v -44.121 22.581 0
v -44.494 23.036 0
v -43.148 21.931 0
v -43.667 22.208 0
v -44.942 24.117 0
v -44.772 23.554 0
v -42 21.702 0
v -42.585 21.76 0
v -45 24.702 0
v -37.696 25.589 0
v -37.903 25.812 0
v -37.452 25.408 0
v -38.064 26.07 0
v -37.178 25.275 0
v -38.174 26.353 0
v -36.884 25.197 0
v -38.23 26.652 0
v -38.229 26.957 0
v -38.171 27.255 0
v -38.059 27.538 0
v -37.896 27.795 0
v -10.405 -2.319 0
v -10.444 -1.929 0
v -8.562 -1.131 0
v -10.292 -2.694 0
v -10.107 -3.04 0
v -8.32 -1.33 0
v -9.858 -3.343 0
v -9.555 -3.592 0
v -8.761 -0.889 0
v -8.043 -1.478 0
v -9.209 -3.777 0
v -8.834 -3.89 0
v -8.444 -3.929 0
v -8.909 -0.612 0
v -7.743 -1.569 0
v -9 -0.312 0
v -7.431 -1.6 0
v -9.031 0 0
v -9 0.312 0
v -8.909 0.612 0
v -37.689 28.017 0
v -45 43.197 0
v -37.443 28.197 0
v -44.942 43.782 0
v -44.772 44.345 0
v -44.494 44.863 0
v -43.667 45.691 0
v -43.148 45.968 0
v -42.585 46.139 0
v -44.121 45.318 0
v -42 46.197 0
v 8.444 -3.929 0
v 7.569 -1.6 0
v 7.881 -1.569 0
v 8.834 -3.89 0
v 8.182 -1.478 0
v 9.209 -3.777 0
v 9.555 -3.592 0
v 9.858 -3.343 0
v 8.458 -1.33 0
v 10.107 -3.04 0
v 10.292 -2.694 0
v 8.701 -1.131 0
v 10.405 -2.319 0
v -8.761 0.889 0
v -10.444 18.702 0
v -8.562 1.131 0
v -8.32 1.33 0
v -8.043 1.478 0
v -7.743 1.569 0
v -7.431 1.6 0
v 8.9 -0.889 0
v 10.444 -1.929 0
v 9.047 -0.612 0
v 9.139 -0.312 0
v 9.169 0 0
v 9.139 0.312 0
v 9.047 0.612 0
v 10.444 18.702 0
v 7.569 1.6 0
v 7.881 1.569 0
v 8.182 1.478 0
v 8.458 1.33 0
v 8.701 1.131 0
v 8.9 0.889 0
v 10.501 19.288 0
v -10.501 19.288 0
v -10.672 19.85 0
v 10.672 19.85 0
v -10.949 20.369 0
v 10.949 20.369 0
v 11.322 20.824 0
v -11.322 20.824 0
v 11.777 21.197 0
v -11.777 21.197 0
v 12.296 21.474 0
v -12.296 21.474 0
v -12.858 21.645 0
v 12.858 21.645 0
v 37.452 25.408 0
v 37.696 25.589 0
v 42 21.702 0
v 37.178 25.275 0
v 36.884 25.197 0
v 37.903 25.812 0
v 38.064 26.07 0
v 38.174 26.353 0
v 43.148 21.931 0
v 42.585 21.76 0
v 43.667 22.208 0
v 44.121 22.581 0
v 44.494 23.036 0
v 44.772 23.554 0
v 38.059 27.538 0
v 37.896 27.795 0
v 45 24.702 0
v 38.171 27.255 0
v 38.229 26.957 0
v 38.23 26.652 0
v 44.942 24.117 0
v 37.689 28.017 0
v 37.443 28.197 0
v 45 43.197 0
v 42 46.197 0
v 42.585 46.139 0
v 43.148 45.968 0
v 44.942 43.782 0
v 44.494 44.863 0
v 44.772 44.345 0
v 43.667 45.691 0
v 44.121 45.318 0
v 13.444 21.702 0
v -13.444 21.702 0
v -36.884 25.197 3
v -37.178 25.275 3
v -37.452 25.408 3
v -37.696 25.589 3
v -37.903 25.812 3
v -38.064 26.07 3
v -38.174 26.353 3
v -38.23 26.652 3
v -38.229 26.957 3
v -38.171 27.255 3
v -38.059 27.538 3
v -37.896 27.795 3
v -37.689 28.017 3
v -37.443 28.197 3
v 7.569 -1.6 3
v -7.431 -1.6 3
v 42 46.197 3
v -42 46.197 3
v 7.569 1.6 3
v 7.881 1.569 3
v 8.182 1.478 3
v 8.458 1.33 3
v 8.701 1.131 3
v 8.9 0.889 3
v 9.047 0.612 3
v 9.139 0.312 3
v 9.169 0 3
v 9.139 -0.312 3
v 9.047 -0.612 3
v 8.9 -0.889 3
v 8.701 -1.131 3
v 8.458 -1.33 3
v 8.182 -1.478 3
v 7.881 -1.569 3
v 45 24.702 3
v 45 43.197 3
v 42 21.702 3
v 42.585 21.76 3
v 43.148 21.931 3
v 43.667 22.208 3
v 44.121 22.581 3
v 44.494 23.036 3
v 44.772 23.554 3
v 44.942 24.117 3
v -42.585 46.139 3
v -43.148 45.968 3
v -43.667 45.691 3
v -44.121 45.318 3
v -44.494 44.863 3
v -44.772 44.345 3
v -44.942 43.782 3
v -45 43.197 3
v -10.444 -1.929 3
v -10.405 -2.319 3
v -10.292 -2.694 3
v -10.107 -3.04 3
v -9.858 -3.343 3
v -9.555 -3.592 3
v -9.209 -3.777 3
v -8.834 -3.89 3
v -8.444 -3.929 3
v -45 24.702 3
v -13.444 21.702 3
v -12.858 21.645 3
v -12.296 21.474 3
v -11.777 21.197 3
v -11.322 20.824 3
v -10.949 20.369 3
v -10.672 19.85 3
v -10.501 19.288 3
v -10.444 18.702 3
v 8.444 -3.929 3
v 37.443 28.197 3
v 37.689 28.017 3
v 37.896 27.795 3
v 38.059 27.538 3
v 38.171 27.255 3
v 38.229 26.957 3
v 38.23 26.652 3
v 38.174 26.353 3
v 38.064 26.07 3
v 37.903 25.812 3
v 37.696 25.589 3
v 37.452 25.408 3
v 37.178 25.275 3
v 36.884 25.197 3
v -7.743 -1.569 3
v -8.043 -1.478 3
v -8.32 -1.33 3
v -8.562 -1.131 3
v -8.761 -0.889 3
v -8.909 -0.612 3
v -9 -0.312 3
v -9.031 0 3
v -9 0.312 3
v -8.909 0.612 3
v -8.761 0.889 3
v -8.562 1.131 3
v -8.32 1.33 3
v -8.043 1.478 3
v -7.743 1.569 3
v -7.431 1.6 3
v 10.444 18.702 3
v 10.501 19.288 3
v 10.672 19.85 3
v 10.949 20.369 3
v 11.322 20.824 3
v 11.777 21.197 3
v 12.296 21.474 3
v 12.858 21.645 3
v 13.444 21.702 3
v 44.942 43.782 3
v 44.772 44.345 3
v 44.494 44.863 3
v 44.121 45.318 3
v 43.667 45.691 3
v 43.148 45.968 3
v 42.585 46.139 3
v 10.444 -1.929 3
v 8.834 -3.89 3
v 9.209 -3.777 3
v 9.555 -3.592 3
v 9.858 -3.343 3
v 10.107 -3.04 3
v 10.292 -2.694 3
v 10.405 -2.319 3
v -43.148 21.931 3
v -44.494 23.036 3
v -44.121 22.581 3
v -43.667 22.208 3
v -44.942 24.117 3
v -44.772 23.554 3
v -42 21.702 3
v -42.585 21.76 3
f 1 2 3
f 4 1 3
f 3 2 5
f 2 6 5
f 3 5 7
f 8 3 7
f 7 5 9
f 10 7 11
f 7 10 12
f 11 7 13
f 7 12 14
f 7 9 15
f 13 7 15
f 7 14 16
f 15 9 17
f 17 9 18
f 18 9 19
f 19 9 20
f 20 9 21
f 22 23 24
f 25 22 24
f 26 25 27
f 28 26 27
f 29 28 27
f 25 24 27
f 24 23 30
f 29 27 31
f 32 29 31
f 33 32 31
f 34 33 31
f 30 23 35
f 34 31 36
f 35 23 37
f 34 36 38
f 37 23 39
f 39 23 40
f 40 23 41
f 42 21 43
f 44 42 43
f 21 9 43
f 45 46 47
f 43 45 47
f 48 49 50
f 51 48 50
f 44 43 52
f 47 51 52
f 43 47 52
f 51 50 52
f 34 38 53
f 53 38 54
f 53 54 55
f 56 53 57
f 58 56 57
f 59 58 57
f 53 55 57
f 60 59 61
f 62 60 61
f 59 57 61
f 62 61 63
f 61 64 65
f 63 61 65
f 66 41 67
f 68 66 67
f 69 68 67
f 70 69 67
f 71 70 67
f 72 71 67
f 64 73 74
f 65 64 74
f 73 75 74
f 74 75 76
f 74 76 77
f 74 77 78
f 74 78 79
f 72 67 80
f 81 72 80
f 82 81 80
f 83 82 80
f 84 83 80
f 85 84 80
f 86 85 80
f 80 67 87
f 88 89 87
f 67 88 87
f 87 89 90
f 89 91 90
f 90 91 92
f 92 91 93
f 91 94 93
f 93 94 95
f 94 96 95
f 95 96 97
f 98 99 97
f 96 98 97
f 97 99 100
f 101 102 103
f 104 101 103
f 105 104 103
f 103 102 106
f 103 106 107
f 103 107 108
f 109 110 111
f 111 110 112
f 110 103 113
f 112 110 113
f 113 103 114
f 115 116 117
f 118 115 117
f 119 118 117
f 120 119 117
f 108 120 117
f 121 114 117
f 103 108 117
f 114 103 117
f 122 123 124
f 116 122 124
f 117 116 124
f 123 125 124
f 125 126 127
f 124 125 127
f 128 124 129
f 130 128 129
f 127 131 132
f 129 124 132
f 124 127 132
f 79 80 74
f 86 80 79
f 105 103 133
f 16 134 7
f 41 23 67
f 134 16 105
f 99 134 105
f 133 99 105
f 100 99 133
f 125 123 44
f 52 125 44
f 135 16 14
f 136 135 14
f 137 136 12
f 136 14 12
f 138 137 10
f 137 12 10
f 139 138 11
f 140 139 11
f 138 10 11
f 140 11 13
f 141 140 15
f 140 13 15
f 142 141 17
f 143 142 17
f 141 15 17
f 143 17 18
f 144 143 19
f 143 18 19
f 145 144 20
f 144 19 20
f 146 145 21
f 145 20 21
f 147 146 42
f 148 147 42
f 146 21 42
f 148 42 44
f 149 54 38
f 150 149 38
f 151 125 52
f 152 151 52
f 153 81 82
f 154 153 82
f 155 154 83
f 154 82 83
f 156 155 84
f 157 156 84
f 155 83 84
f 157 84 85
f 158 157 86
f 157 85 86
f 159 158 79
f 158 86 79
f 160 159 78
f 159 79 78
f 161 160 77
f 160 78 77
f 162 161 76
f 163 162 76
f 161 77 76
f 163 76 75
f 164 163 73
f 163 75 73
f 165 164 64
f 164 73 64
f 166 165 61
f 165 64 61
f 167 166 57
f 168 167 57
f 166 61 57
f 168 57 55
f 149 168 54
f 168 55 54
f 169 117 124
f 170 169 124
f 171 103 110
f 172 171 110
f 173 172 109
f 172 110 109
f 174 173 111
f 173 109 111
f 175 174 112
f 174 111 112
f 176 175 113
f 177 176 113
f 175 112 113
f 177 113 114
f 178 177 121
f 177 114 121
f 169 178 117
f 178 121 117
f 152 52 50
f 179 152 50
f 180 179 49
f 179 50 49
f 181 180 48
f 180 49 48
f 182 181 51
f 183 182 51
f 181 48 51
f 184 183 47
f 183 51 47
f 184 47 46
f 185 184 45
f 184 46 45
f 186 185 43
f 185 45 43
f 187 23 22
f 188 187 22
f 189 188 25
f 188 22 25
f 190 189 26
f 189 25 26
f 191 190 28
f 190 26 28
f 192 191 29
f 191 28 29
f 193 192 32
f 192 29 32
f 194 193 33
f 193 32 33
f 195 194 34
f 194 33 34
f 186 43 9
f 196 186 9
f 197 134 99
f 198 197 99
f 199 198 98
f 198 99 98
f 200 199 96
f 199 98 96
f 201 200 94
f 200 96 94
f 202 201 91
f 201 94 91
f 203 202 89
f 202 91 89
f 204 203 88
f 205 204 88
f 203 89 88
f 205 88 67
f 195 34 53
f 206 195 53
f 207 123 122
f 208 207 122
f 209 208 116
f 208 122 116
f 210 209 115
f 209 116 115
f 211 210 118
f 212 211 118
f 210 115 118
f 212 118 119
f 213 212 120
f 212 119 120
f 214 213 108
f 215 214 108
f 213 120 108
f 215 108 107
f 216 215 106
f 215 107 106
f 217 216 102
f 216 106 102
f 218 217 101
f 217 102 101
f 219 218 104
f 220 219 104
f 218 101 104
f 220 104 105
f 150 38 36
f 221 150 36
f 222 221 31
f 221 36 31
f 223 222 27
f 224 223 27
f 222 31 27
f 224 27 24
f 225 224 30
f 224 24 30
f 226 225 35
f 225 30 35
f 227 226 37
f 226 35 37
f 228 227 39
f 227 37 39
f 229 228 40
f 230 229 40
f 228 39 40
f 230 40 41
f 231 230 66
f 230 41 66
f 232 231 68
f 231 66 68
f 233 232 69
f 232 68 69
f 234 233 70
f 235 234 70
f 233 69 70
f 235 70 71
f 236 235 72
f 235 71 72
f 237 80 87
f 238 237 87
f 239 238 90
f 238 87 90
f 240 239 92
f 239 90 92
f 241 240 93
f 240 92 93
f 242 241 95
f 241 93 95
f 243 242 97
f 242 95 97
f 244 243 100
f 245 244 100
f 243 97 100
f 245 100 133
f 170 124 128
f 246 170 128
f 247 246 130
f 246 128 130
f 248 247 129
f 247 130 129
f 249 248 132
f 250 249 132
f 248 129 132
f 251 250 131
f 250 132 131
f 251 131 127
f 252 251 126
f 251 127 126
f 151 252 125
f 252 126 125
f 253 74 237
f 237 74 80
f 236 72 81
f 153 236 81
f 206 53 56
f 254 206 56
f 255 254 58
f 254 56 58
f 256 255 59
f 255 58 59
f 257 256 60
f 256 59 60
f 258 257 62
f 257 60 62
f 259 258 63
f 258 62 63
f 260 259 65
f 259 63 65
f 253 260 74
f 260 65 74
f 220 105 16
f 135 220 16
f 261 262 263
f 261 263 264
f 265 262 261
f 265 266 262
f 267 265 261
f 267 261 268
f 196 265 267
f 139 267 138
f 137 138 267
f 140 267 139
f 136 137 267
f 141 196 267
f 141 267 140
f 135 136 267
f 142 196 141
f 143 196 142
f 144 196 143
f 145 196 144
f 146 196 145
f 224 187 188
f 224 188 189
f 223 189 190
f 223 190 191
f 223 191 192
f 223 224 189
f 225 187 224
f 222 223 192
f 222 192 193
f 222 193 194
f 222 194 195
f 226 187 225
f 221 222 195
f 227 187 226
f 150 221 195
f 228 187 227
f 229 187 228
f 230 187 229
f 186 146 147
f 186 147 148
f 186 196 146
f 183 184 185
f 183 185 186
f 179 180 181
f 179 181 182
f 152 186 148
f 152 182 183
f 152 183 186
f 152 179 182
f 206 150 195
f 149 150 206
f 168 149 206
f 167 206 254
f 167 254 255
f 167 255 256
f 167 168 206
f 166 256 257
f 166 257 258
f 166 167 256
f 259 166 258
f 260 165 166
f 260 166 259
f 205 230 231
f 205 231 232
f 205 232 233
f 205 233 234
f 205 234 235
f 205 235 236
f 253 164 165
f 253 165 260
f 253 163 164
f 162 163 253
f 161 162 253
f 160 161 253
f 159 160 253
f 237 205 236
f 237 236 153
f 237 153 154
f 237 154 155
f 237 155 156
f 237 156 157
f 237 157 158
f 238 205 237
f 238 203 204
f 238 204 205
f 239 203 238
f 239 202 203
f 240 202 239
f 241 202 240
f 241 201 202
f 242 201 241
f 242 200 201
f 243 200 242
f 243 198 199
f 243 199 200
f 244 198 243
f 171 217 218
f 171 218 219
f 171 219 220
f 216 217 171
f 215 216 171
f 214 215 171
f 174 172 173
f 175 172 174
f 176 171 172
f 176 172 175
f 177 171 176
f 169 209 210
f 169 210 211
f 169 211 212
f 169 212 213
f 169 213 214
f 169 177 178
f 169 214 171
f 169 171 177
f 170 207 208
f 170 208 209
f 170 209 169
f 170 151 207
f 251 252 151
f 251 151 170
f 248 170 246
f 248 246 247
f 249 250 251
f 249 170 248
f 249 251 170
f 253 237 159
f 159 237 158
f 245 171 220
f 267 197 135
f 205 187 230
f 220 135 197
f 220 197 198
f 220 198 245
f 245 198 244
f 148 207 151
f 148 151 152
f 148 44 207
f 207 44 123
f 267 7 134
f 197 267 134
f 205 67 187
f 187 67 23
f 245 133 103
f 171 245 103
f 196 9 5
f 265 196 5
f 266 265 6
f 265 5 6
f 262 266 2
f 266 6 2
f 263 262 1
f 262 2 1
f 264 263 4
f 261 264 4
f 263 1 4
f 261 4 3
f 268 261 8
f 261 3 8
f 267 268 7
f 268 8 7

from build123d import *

# Parameters (mm, degrees)
EXTRUDE_2_DEPTH = 3


with BuildPart() as part:
    # 草图1 → 凸台-拉伸2 (new body)
    with BuildSketch(Plane.XY):
        with BuildLine():
            Line((-8.443741515, -3.928837448), (8.443741515, -3.928837448))
            ThreePointArc((8.443741515, -3.928837448), (9.857955078, -3.34305101), (10.443741515, -1.928837448))
            Line((10.443741515, -1.928837448), (10.443741515, 1.702434927))
            Line((10.443741515, 1.702434927), (10.443741515, 18.702434927))
            ThreePointArc((10.443741515, 18.702434927), (11.322421172, 20.823755271), (13.443741515, 21.702434927))
            Line((13.443741515, 21.702434927), (42, 21.702434927))
            ThreePointArc((42, 21.702434927), (44.121320344, 22.581114584), (45, 24.702434927))
            Line((45, 24.702434927), (45, 43.196509927))
            ThreePointArc((45, 43.196509927), (44.121320344, 45.31783027), (42, 46.196509927))
            Line((42, 46.196509927), (-42, 46.196509927))
            ThreePointArc((-42, 46.196509927), (-44.121320344, 45.31783027), (-45, 43.196509927))
            Line((-45, 43.196509927), (-45, 24.702434927))
            ThreePointArc((-45, 24.702434927), (-44.121320344, 22.581114584), (-42, 21.702434927))
            Line((-42, 21.702434927), (-13.443741515, 21.702434927))
            ThreePointArc((-13.443741515, 21.702434927), (-11.322421172, 20.823755271), (-10.443741515, 18.702434927))
            Line((-10.443741515, 18.702434927), (-10.443741515, 1.702434927))
            Line((-10.443741515, 1.702434927), (-10.443741515, -1.928837448))
            ThreePointArc((-10.443741515, -1.928837448), (-9.857955078, -3.34305101), (-8.443741515, -3.928837448))
        make_face()
        with BuildLine():
            Line((-7.430734656, 1.6), (7.569265344, 1.6))
            ThreePointArc((7.569265344, 1.6), (9.169265344, 0), (7.569265344, -1.6))
            Line((7.569265344, -1.6), (-7.430734656, -1.6))
            ThreePointArc((-7.430734656, -1.6), (-9.030734656, 0), (-7.430734656, 1.6))
        make_face(mode=Mode.SUBTRACT)
        with BuildLine():
            Line((36.883924739, 25.196509927), (-36.883924739, 25.196509927))
            ThreePointArc((-36.883924739, 25.196509927), (-38.209103575, 26.501622059), (-37.4430933, 28.196509927))
            Line((-37.4430933, 28.196509927), (37.4430933, 28.196509927))
            ThreePointArc((37.4430933, 28.196509927), (38.209103575, 26.501622059), (36.883924739, 25.196509927))
        make_face(mode=Mode.SUBTRACT)
    extrude(amount=EXTRUDE_2_DEPTH)


solid = part.part
